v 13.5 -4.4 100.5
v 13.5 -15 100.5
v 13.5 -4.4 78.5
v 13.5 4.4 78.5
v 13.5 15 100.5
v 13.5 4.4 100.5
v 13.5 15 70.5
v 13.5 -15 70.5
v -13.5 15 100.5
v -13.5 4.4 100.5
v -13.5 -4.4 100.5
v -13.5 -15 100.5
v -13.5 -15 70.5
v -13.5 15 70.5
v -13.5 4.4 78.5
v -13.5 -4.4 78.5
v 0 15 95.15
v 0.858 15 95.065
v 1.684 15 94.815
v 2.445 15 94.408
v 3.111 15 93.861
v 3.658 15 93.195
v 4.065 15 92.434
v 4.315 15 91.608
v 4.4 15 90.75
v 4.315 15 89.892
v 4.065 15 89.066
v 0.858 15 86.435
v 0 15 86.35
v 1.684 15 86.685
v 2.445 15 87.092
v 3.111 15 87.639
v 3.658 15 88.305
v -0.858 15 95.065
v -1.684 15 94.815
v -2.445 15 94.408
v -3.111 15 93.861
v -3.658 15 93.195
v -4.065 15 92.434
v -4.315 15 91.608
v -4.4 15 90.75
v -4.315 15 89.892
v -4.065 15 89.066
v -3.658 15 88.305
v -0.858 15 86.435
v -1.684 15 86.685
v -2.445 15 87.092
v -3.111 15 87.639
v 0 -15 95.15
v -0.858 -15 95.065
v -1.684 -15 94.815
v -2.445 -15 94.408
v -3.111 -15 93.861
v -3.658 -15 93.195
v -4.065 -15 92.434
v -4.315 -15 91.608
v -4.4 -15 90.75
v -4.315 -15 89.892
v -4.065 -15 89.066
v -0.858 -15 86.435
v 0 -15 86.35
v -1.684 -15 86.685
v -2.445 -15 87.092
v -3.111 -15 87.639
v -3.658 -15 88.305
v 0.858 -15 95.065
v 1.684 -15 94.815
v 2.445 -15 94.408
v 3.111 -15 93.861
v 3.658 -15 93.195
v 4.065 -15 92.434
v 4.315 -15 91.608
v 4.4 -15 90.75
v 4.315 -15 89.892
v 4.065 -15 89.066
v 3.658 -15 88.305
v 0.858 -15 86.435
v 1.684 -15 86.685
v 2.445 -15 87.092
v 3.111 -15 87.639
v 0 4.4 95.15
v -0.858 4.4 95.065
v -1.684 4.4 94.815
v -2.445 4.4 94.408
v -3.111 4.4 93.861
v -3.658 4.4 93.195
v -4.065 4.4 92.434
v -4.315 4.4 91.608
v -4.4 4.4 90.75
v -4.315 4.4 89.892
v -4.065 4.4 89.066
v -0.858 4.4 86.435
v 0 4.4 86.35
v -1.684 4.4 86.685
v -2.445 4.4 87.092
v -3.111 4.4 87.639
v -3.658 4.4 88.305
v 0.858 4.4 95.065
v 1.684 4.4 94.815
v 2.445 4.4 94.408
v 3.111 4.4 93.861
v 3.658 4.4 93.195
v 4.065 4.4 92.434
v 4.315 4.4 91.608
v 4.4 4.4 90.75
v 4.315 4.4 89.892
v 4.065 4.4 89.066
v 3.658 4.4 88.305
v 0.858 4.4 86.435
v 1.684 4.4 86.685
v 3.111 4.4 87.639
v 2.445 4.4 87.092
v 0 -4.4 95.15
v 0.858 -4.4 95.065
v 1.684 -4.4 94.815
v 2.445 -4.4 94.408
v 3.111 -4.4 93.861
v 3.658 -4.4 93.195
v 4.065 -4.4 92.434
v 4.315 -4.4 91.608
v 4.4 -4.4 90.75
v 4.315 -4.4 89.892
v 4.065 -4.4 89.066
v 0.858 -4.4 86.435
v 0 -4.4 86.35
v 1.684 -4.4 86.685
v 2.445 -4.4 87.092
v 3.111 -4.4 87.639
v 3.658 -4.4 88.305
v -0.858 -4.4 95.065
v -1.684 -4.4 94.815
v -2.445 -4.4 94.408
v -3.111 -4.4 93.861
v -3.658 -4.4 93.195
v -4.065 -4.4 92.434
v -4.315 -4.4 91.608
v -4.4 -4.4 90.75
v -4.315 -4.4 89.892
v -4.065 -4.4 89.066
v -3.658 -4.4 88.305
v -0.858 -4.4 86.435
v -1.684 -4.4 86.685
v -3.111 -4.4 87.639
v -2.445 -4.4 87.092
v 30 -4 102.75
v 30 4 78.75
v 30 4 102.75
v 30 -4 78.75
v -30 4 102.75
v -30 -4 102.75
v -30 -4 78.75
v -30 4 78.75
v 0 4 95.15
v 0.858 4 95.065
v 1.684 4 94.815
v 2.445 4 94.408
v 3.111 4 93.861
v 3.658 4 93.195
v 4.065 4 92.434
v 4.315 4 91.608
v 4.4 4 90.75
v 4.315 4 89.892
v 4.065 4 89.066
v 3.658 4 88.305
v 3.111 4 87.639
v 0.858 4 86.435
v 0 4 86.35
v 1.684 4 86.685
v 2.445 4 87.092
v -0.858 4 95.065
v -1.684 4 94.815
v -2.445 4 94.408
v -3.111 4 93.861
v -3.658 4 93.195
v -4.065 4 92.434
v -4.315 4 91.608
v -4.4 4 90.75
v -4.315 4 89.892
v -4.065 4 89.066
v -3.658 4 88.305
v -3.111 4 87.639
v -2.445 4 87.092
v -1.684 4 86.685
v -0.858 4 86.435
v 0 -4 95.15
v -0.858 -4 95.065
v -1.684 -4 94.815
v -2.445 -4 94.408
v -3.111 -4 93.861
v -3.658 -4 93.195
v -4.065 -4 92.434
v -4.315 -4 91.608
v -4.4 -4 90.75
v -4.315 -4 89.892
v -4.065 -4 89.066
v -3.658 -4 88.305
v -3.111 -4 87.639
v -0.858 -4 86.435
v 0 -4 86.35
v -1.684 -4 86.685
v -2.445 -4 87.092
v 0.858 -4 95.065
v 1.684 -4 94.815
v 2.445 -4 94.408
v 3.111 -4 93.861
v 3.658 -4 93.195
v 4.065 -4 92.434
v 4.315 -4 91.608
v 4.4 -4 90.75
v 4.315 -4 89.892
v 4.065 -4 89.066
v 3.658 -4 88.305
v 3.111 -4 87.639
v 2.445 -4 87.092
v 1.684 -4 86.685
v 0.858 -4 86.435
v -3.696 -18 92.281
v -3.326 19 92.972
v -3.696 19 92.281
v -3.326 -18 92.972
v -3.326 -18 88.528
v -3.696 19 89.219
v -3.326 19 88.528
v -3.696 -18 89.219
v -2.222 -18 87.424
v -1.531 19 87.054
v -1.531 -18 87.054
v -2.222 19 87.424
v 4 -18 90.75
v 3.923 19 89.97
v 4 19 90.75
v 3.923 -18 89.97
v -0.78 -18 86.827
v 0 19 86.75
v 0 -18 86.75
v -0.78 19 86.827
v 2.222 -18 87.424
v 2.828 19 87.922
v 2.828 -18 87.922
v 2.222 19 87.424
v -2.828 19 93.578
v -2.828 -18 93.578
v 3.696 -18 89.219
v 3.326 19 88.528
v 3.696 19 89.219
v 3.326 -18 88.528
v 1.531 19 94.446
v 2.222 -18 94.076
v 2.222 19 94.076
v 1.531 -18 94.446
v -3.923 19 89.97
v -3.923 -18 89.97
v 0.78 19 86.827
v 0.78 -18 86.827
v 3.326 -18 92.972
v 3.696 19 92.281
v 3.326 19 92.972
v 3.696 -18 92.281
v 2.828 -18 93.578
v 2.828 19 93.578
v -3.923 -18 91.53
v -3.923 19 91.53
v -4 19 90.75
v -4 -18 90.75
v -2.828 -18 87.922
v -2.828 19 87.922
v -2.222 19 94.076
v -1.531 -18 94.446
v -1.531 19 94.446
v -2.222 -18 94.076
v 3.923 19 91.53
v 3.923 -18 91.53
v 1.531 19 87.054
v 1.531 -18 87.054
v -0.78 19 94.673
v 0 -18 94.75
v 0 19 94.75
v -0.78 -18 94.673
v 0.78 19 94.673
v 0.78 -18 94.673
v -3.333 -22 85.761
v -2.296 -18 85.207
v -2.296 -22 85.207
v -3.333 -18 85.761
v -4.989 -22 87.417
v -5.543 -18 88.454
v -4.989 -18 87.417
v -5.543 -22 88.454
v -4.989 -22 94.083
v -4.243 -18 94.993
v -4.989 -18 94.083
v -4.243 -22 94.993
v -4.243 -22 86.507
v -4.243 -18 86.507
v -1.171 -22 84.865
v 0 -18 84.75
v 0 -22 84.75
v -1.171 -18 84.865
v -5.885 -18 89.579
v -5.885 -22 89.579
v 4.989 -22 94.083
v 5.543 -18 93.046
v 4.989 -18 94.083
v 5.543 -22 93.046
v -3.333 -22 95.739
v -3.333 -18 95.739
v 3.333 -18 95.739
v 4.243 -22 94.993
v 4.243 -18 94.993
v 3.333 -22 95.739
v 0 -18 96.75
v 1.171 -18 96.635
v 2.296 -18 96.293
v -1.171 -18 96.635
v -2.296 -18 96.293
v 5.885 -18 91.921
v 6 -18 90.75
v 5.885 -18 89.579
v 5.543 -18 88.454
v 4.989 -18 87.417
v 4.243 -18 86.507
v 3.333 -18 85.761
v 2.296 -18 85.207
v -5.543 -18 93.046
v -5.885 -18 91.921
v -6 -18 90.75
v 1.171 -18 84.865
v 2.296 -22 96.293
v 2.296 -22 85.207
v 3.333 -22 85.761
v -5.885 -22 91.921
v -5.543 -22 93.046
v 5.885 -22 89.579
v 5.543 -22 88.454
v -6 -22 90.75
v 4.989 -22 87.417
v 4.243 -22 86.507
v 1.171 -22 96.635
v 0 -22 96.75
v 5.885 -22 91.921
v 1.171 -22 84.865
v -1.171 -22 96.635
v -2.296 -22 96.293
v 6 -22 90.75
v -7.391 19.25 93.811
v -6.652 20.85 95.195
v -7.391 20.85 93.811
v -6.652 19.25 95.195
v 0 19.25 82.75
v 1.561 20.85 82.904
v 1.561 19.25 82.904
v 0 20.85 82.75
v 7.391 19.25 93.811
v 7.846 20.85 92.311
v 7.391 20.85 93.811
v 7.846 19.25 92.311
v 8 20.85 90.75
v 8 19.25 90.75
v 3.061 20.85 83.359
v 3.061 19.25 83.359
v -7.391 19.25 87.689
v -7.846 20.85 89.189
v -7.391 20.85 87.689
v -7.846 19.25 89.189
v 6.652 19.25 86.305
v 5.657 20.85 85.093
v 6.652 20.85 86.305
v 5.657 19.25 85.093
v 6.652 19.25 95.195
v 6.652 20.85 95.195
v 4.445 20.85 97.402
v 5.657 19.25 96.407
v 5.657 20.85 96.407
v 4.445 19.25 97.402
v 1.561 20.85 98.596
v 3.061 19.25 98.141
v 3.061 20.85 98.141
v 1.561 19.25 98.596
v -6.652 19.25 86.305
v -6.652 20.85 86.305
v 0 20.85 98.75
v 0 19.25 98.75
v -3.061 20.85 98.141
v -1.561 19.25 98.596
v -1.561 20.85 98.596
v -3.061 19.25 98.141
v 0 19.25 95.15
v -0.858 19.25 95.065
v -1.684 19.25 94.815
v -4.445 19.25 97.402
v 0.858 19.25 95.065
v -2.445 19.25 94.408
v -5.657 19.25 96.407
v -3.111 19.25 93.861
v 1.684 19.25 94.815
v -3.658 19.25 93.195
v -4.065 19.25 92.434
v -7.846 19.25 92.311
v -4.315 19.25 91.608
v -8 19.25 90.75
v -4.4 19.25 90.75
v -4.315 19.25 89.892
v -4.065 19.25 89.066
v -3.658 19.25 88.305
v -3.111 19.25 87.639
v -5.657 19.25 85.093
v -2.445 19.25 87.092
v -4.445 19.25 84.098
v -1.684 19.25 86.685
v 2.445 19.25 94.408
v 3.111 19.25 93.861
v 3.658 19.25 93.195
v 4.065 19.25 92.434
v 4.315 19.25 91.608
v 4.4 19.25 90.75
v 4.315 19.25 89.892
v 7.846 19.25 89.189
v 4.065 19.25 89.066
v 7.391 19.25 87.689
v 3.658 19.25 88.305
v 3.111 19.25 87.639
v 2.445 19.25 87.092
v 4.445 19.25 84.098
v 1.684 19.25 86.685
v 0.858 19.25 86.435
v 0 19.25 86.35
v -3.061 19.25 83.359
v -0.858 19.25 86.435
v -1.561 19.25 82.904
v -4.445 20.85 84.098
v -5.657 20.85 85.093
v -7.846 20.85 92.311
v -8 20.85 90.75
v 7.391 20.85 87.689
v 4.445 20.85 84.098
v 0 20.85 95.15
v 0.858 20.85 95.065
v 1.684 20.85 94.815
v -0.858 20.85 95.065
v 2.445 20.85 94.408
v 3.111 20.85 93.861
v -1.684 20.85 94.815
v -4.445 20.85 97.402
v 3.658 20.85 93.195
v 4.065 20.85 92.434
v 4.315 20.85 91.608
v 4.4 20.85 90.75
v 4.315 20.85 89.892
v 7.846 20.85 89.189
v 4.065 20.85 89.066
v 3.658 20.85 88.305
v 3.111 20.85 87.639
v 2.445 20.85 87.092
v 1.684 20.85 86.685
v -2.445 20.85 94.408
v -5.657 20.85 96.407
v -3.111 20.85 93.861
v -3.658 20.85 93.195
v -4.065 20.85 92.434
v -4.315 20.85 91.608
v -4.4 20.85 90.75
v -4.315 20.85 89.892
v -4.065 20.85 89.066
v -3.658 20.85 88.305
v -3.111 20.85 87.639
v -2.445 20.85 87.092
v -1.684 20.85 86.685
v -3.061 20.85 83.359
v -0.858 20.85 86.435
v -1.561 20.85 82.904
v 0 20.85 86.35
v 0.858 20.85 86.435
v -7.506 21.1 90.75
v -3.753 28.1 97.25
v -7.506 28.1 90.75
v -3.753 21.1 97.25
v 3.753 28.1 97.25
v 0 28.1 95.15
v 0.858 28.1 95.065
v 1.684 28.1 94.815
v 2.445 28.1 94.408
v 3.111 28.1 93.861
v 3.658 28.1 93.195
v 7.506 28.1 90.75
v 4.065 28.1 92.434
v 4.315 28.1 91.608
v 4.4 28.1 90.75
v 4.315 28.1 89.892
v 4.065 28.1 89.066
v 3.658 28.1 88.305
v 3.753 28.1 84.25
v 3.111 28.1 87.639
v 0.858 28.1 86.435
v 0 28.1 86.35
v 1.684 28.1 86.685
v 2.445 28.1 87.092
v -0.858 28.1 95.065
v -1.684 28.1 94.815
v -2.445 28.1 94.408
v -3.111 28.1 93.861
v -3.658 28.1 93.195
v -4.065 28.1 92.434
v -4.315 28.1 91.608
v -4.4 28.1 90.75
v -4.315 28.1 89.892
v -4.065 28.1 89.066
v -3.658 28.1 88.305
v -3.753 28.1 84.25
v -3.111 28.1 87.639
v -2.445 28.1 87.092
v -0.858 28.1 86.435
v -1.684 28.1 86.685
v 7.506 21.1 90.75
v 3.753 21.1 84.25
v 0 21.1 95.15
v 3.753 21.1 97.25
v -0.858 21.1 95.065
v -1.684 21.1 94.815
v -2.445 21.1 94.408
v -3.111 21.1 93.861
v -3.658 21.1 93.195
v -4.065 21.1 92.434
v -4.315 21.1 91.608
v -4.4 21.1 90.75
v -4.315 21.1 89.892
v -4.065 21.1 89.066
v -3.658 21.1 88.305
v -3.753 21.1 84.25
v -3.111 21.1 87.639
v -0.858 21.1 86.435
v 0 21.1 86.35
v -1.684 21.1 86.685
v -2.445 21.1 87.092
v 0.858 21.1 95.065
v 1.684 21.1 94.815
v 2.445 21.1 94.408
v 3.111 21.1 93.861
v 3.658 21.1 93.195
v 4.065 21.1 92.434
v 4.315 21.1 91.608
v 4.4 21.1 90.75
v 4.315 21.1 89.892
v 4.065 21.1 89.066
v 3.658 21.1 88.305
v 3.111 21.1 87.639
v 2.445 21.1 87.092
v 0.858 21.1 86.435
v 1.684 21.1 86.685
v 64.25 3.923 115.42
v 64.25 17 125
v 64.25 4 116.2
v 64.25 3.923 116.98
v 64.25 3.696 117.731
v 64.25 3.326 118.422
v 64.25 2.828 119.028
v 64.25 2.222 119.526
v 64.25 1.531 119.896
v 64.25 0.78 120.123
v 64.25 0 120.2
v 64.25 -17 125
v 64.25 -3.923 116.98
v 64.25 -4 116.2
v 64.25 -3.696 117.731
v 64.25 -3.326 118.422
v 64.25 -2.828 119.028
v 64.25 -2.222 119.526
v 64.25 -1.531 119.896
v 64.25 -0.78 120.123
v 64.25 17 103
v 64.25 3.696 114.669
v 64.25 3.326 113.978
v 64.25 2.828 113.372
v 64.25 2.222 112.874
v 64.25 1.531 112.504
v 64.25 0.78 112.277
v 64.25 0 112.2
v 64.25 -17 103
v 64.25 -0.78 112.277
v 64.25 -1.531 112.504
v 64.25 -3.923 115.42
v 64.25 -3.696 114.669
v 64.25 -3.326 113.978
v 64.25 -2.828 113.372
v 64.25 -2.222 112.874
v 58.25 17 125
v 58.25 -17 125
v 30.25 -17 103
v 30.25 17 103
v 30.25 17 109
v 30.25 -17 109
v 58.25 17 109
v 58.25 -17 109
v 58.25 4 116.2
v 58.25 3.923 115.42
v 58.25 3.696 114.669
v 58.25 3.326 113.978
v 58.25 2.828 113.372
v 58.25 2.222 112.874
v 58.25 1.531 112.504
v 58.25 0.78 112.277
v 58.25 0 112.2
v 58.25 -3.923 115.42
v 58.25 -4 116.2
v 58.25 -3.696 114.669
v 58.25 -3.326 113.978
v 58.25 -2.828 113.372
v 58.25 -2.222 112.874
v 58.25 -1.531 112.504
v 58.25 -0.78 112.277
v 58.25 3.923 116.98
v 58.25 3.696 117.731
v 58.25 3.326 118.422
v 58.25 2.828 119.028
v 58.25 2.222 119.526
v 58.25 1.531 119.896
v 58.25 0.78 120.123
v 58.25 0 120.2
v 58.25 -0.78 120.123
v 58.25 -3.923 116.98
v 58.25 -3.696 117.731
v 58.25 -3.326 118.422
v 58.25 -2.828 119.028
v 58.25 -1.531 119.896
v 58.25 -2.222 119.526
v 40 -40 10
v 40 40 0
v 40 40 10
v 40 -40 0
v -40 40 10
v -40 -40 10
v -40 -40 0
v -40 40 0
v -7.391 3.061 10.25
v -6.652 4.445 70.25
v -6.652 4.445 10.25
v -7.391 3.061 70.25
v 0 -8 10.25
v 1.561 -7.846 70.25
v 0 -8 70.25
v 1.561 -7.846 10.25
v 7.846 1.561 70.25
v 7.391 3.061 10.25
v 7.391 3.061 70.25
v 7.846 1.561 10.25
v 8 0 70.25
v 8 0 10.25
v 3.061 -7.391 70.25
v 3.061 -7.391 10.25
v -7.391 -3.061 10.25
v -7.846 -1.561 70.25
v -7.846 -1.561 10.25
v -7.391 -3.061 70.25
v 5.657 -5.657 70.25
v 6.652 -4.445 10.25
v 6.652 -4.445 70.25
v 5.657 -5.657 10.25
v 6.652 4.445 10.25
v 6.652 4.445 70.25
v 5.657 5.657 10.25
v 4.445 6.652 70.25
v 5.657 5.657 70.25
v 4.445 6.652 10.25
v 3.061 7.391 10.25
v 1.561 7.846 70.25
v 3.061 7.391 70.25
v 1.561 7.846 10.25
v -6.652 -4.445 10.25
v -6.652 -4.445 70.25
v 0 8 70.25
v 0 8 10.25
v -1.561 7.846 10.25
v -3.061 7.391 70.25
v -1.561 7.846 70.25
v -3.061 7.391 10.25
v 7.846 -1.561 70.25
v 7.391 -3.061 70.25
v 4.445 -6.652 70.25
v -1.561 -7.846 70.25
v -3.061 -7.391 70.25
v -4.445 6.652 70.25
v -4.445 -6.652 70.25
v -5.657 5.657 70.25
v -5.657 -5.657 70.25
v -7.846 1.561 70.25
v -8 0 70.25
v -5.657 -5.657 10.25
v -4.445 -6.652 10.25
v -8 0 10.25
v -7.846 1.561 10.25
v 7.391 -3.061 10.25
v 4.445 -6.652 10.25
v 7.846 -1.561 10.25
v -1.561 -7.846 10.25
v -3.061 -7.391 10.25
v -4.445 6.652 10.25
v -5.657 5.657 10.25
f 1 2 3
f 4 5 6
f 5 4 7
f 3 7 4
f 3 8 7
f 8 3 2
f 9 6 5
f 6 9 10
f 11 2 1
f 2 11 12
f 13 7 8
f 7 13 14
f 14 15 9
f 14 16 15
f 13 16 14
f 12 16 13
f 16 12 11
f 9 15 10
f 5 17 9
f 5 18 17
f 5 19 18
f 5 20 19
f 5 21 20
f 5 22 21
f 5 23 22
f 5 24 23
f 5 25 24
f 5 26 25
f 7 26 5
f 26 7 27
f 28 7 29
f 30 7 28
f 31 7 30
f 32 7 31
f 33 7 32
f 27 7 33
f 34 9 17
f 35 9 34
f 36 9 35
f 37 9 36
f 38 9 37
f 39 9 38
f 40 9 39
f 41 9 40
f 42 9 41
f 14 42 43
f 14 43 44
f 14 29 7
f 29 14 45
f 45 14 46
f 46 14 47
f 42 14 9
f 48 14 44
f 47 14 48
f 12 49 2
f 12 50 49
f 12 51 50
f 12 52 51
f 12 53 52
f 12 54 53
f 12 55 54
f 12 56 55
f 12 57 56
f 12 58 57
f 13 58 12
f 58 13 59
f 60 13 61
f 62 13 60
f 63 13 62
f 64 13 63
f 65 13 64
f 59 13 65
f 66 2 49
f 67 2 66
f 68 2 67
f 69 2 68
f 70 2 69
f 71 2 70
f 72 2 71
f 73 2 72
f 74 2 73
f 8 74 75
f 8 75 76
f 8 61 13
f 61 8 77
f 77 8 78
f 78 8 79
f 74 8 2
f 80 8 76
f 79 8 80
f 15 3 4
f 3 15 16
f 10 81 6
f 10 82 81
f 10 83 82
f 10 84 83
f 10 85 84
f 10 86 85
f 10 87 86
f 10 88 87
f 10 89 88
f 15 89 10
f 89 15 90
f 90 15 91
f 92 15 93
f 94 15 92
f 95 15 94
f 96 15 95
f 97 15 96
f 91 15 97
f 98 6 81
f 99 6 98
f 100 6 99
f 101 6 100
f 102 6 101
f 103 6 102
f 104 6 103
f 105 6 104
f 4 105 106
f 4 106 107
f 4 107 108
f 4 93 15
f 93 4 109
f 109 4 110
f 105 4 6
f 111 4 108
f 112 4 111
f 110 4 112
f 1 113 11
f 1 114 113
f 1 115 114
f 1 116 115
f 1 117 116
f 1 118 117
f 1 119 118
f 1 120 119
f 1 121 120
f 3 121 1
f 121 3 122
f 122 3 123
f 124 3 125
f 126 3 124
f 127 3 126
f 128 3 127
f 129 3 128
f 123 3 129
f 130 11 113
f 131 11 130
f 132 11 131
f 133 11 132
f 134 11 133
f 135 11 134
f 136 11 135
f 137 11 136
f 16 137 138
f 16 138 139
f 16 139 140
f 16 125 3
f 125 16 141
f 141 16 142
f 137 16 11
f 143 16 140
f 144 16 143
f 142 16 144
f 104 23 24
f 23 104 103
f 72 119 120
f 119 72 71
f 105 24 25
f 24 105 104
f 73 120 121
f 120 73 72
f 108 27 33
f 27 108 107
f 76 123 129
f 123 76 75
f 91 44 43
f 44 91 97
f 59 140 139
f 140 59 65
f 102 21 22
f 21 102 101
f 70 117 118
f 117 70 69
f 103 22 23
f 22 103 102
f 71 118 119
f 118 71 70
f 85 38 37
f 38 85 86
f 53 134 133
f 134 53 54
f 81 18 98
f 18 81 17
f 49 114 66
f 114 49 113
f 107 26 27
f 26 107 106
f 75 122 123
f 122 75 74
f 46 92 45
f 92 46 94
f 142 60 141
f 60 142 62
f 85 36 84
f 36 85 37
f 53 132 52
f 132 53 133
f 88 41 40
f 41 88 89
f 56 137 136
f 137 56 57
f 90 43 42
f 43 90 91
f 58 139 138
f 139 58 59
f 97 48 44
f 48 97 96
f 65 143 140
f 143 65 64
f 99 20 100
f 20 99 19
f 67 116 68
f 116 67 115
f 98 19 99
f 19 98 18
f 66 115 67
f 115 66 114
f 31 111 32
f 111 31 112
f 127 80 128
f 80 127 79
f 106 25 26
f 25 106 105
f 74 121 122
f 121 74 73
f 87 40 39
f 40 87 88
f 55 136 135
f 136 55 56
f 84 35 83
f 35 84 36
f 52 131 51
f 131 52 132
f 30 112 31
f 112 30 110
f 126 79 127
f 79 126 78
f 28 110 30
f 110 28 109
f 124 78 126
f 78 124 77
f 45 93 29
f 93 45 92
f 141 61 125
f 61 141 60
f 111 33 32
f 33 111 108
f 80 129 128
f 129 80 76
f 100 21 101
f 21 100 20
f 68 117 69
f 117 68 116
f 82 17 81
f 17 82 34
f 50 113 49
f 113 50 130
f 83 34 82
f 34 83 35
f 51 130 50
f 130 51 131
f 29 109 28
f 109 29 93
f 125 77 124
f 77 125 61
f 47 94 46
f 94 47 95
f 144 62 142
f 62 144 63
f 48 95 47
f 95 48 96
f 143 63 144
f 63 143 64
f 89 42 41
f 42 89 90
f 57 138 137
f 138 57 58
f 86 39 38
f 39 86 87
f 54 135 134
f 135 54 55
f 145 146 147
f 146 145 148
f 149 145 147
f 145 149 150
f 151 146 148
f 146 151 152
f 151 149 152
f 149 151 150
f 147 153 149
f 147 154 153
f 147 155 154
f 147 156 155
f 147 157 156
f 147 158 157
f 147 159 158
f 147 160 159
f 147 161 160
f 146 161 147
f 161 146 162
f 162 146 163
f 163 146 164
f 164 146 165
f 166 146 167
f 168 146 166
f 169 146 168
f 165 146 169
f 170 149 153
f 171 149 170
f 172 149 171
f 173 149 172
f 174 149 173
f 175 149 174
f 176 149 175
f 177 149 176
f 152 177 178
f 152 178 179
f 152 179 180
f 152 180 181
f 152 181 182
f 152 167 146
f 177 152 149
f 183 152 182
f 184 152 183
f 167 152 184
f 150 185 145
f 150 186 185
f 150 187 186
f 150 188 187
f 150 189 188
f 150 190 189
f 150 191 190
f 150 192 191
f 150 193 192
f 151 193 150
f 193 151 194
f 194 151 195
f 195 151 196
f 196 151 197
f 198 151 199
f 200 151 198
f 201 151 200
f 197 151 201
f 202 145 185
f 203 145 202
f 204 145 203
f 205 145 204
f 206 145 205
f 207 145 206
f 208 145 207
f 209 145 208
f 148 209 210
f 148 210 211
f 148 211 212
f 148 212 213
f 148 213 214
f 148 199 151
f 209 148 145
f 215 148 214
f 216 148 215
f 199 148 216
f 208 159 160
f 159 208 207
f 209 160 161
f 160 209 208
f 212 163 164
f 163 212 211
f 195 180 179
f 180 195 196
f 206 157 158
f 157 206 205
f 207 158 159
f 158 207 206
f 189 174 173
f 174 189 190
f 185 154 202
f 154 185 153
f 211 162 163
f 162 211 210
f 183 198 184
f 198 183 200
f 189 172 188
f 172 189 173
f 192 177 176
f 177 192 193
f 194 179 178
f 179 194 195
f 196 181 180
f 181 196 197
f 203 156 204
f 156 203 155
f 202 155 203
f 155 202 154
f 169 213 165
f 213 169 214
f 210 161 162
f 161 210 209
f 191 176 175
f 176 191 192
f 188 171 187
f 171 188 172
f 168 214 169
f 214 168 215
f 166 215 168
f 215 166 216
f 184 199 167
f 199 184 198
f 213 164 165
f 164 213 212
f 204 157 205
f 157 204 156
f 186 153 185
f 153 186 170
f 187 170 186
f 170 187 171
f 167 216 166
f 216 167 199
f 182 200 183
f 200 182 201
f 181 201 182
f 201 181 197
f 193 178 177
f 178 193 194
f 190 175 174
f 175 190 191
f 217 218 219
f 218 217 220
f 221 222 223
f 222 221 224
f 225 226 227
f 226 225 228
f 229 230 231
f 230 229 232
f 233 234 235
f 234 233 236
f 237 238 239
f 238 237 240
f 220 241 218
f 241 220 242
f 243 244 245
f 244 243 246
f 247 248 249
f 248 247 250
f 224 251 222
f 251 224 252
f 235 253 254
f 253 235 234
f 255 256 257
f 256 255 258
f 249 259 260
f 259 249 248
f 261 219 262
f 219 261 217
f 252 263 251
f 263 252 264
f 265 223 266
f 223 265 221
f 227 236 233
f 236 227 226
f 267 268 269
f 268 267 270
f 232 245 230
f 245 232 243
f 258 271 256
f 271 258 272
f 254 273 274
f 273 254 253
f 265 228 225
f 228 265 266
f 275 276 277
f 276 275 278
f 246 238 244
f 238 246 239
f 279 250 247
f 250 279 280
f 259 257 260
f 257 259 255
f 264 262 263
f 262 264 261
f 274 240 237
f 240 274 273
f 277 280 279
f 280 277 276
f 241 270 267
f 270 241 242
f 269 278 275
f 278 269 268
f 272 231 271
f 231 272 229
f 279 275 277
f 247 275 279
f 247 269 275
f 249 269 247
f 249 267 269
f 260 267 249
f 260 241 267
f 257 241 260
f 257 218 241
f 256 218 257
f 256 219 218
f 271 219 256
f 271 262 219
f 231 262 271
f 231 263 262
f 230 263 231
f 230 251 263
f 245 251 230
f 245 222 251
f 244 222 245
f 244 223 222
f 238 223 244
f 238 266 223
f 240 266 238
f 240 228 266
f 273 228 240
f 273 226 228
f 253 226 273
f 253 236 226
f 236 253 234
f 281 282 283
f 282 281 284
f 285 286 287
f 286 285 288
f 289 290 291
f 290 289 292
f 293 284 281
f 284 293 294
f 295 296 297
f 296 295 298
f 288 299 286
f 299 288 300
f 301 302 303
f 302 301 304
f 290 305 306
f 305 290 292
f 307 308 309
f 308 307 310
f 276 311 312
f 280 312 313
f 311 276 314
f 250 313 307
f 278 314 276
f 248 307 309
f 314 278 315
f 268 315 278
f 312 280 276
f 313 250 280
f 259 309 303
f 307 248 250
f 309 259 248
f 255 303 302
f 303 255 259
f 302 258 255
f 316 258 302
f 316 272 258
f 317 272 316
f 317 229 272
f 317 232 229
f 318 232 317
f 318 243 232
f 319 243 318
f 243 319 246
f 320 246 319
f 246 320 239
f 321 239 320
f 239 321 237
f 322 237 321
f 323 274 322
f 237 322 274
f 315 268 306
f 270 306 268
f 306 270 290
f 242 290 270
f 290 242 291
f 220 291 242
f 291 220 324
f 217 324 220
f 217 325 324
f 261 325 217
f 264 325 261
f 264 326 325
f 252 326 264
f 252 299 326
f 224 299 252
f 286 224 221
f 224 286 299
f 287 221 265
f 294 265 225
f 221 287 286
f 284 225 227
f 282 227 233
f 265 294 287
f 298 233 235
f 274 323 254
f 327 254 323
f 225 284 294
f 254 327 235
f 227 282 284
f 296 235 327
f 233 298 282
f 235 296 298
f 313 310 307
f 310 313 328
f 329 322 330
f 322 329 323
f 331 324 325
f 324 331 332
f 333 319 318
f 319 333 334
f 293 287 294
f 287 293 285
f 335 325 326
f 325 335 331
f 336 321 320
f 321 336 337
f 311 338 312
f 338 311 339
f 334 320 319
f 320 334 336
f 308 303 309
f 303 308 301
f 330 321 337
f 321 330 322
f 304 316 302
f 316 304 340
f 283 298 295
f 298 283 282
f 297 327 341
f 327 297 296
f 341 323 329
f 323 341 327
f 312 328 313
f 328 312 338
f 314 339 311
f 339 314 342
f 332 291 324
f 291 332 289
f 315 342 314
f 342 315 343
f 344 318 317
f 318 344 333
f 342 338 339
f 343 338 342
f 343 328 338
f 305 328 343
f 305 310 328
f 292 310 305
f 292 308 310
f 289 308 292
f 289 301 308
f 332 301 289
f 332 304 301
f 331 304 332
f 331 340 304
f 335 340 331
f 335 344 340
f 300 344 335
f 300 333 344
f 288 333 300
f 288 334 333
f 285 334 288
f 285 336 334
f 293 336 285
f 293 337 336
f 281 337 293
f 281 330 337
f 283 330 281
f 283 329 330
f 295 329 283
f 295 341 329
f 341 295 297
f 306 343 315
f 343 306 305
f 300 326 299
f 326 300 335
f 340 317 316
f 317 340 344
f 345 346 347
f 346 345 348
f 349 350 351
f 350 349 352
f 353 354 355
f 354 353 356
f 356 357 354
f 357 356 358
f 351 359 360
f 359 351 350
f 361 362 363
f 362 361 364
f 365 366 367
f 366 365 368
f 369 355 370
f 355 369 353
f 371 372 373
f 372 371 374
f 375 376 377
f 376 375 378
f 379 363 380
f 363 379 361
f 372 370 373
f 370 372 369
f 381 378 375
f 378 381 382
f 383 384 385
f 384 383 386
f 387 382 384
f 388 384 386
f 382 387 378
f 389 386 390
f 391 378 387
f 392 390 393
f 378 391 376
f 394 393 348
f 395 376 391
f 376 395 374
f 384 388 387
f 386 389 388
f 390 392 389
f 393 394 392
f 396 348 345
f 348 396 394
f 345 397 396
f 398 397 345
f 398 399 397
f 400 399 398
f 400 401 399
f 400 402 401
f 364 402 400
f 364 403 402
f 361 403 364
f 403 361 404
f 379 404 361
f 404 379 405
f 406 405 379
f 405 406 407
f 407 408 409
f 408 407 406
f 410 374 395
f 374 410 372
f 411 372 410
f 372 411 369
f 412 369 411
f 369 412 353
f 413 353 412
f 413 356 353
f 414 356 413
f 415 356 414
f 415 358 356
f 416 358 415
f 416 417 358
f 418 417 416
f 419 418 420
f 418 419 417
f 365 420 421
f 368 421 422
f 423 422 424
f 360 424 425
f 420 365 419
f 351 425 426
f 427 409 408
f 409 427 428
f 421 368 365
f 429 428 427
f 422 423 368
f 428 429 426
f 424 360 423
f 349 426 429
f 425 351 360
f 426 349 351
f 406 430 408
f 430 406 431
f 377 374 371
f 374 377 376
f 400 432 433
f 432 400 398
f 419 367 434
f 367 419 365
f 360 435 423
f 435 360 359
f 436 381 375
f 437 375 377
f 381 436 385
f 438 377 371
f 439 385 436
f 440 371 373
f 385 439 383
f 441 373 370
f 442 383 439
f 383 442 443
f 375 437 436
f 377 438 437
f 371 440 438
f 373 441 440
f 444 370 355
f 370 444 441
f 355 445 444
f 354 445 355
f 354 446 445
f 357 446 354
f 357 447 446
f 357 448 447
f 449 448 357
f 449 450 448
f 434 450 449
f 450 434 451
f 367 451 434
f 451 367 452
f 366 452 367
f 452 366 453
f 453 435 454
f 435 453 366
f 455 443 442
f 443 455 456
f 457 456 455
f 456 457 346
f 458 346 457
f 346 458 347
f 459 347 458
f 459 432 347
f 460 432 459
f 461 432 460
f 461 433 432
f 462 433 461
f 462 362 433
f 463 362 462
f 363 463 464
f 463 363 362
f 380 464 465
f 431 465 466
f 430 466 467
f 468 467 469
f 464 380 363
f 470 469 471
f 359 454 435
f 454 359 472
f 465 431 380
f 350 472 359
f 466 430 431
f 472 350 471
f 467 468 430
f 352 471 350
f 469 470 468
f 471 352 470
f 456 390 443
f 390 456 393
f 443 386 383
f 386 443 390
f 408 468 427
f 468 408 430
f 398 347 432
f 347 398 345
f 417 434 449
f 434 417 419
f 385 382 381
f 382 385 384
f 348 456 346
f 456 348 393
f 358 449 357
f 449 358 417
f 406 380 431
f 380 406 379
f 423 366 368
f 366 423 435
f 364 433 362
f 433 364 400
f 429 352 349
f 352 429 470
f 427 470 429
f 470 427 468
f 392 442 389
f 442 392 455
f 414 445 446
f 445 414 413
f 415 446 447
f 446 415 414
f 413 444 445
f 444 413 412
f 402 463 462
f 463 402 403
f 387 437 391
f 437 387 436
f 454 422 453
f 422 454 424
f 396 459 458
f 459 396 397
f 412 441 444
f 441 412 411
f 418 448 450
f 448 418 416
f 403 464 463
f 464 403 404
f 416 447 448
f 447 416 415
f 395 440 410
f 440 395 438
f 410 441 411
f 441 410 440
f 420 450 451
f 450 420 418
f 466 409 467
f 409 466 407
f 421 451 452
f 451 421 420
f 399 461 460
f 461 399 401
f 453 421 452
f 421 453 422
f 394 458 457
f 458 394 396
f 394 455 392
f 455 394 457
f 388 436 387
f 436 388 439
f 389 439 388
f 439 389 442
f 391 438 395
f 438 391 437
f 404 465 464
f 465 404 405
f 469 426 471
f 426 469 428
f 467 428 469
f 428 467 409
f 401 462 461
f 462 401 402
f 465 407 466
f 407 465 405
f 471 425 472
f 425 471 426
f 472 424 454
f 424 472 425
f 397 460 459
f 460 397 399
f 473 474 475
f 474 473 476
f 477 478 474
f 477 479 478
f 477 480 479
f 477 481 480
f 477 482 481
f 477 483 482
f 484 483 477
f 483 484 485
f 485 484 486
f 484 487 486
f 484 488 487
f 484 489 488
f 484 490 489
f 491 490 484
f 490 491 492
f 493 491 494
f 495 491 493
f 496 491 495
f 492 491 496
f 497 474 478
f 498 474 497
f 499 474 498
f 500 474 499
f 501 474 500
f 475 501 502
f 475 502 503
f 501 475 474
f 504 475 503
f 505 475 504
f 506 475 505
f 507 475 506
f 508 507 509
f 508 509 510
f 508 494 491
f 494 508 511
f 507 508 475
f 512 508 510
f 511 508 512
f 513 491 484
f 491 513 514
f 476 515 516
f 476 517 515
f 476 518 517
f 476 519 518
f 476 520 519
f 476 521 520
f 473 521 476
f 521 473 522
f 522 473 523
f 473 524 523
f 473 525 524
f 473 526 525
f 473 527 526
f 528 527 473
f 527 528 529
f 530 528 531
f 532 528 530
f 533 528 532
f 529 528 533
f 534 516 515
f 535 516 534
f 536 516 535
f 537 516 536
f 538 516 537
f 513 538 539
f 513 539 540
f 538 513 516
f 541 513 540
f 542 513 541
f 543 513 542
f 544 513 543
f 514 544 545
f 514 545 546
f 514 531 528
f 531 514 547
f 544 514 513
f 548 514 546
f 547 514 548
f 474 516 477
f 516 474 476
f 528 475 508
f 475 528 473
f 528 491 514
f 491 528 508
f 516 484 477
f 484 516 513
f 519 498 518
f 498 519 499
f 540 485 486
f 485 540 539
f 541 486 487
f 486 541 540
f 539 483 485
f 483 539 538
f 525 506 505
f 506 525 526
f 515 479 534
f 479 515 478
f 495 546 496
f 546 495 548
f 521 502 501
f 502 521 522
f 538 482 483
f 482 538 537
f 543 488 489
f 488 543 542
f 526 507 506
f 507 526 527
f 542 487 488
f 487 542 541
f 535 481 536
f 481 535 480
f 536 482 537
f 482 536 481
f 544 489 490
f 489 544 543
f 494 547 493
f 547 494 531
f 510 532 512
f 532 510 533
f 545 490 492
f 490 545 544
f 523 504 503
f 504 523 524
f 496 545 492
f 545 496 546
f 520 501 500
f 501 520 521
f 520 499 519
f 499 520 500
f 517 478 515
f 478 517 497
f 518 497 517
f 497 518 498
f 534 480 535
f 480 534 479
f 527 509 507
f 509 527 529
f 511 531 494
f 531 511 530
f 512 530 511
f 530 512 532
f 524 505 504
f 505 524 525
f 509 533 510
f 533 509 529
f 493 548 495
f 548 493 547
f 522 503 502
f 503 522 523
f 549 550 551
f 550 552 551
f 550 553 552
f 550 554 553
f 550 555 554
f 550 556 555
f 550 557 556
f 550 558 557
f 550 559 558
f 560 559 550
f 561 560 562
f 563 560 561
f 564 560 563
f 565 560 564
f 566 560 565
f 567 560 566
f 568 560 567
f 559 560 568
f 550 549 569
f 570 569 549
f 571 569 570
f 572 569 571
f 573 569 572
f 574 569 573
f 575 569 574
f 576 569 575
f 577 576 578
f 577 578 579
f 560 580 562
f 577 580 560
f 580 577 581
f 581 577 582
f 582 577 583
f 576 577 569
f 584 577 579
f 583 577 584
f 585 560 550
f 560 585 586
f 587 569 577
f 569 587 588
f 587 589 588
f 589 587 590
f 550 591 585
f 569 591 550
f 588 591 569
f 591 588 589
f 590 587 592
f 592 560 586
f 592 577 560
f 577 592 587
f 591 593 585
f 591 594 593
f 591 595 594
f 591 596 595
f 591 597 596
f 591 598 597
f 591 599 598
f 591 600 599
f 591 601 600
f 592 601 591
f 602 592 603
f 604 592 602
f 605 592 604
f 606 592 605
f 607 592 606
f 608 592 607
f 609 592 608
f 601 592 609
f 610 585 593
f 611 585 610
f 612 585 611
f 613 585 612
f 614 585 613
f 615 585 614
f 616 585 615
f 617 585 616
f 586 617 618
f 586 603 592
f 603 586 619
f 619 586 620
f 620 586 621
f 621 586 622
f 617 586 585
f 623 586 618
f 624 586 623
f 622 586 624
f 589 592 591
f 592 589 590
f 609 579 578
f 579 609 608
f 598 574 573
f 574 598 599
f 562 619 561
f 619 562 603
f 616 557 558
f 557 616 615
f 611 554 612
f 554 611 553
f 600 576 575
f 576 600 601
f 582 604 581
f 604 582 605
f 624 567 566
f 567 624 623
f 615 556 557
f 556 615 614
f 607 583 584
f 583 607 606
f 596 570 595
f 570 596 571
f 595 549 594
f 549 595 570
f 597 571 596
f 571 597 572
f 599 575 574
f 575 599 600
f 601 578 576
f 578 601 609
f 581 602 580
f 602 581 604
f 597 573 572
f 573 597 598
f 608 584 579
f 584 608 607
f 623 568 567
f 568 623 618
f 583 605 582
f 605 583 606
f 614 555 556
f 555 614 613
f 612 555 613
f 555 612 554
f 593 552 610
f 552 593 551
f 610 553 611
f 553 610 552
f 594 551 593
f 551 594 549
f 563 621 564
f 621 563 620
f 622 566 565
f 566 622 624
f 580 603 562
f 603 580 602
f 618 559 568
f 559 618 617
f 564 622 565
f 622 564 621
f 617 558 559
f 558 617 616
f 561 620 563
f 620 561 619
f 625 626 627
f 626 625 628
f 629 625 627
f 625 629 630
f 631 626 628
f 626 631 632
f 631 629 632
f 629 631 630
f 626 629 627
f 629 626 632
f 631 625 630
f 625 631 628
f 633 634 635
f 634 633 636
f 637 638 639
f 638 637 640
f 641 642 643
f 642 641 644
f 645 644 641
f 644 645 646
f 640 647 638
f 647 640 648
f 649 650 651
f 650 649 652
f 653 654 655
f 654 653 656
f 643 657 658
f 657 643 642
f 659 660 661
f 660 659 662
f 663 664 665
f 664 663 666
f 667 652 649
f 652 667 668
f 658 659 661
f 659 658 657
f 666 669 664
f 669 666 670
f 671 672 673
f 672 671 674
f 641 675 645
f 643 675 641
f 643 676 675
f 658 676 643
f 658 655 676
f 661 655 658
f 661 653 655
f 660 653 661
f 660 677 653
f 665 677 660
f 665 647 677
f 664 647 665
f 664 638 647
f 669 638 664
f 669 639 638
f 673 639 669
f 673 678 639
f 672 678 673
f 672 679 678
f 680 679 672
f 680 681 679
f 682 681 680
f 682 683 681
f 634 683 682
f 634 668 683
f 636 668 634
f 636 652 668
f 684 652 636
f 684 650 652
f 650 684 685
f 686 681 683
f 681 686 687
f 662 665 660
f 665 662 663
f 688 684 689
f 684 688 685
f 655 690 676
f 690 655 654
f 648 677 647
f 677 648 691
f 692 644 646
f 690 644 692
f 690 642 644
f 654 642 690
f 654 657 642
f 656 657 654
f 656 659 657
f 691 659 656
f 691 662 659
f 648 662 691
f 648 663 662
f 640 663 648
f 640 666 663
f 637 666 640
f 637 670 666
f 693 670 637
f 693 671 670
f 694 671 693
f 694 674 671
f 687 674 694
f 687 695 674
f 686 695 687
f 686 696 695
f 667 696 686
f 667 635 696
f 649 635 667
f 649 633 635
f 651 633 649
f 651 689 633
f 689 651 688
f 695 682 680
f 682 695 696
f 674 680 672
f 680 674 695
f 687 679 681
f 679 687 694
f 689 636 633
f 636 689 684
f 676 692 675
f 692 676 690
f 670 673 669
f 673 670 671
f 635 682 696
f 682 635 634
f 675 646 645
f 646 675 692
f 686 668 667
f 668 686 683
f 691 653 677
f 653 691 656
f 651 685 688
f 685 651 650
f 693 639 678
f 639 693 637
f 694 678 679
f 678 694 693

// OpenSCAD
$fn = 32;

// ------------------------------------------------------------------------
// Lamp arm: column d16 x 60 mm, arm 60 mm
// Every part is its own module, assembly() places every instance.
// ------------------------------------------------------------------------

// --- part 1 ---
module lamp_base() {
  difference() {
    translate([-40, -40, 0]) cube([80, 80, 10]);
  }
}

// --- part 2 ---
module lamp_column() {
  cylinder(h = 60, d = 16);
}

// --- part 3 ---
module head_fork() {
  difference() {
    translate([-13.5, -15, 0]) cube([27, 30, 30]);
    translate([-14.5, -4.4, 8]) cube([29, 8.8, 23]);
    translate([0, 0, 20.25]) rotate([90, 0, 0]) cylinder(h = 32, d = 8.8, center = true);
  }
}

// --- part 4 ---
module lamp_arm() {
  difference() {
    translate([-30, -4, 0]) cube([60, 8, 24]);
    translate([0, 0, 12]) rotate([90, 0, 0]) cylinder(h = 10, d = 8.8, center = true);
  }
}

// --- part 5 ---
module arm_pin() {
  rotate([0, 90, 0]) cylinder(h = 38, d = 8, center = true);
  translate([-22, 0, 0]) rotate([0, 90, 0]) cylinder(h = 4, d = 12);
}

// --- part 6 ---
module arm_washer() {
  difference() {
      translate([0, 0, 0]) cylinder(h = 1.6, d = 16);
      translate([0, 0, -1]) cylinder(h = 3.6, d = 8.8);
    }
}

// --- part 7 ---
module arm_nut() {
  difference() {
    linear_extrude(height = 7) polygon(points = [[7.506, 0], [3.753, 6.5], [-3.753, 6.5], [-7.506, 0], [-3.753, -6.5], [3.753, -6.5]]);
    translate([0, 0, -1]) cylinder(h = 9, d = 8.8);
  }
}

// --- part 8 ---
module shade_bracket() {
  difference() {
    translate([-17, -17, 0]) cube([34, 34, 22]);
    translate([-18, -18, 6]) cube([29, 36, 17]);
    translate([14, 0, 13.2]) rotate([0, 90, 0]) cylinder(h = 8, d = 8, center = true);
  }
}

// --- assembly ---
module assembly() {
  color([0.80, 0.24, 0.20]) translate([0, 0, 0]) rotate([0, 0, 0]) lamp_base();
  color([0.20, 0.45, 0.75]) translate([0, 0, 10.25]) rotate([0, 0, 0]) lamp_column();
  color([0.25, 0.62, 0.32]) translate([0, 0, 70.5]) rotate([0, 0, 0]) head_fork();
  color([0.92, 0.70, 0.18]) translate([0, 0, 78.75]) rotate([0, 0, 0]) lamp_arm();
  color([0.58, 0.35, 0.70]) translate([0, 0, 90.75]) rotate([0, 0, 90]) arm_pin();
  color([0.16, 0.66, 0.66]) translate([0, 20.85, 90.75]) rotate([90, 0, 0]) arm_washer();
  color([0.85, 0.48, 0.18]) translate([0, 28.1, 90.75]) rotate([90, 0, 0]) arm_nut();
  color([0.55, 0.60, 0.65]) translate([47.25, 0, 103]) rotate([0, 0, 0]) shade_bracket();
}

assembly();
